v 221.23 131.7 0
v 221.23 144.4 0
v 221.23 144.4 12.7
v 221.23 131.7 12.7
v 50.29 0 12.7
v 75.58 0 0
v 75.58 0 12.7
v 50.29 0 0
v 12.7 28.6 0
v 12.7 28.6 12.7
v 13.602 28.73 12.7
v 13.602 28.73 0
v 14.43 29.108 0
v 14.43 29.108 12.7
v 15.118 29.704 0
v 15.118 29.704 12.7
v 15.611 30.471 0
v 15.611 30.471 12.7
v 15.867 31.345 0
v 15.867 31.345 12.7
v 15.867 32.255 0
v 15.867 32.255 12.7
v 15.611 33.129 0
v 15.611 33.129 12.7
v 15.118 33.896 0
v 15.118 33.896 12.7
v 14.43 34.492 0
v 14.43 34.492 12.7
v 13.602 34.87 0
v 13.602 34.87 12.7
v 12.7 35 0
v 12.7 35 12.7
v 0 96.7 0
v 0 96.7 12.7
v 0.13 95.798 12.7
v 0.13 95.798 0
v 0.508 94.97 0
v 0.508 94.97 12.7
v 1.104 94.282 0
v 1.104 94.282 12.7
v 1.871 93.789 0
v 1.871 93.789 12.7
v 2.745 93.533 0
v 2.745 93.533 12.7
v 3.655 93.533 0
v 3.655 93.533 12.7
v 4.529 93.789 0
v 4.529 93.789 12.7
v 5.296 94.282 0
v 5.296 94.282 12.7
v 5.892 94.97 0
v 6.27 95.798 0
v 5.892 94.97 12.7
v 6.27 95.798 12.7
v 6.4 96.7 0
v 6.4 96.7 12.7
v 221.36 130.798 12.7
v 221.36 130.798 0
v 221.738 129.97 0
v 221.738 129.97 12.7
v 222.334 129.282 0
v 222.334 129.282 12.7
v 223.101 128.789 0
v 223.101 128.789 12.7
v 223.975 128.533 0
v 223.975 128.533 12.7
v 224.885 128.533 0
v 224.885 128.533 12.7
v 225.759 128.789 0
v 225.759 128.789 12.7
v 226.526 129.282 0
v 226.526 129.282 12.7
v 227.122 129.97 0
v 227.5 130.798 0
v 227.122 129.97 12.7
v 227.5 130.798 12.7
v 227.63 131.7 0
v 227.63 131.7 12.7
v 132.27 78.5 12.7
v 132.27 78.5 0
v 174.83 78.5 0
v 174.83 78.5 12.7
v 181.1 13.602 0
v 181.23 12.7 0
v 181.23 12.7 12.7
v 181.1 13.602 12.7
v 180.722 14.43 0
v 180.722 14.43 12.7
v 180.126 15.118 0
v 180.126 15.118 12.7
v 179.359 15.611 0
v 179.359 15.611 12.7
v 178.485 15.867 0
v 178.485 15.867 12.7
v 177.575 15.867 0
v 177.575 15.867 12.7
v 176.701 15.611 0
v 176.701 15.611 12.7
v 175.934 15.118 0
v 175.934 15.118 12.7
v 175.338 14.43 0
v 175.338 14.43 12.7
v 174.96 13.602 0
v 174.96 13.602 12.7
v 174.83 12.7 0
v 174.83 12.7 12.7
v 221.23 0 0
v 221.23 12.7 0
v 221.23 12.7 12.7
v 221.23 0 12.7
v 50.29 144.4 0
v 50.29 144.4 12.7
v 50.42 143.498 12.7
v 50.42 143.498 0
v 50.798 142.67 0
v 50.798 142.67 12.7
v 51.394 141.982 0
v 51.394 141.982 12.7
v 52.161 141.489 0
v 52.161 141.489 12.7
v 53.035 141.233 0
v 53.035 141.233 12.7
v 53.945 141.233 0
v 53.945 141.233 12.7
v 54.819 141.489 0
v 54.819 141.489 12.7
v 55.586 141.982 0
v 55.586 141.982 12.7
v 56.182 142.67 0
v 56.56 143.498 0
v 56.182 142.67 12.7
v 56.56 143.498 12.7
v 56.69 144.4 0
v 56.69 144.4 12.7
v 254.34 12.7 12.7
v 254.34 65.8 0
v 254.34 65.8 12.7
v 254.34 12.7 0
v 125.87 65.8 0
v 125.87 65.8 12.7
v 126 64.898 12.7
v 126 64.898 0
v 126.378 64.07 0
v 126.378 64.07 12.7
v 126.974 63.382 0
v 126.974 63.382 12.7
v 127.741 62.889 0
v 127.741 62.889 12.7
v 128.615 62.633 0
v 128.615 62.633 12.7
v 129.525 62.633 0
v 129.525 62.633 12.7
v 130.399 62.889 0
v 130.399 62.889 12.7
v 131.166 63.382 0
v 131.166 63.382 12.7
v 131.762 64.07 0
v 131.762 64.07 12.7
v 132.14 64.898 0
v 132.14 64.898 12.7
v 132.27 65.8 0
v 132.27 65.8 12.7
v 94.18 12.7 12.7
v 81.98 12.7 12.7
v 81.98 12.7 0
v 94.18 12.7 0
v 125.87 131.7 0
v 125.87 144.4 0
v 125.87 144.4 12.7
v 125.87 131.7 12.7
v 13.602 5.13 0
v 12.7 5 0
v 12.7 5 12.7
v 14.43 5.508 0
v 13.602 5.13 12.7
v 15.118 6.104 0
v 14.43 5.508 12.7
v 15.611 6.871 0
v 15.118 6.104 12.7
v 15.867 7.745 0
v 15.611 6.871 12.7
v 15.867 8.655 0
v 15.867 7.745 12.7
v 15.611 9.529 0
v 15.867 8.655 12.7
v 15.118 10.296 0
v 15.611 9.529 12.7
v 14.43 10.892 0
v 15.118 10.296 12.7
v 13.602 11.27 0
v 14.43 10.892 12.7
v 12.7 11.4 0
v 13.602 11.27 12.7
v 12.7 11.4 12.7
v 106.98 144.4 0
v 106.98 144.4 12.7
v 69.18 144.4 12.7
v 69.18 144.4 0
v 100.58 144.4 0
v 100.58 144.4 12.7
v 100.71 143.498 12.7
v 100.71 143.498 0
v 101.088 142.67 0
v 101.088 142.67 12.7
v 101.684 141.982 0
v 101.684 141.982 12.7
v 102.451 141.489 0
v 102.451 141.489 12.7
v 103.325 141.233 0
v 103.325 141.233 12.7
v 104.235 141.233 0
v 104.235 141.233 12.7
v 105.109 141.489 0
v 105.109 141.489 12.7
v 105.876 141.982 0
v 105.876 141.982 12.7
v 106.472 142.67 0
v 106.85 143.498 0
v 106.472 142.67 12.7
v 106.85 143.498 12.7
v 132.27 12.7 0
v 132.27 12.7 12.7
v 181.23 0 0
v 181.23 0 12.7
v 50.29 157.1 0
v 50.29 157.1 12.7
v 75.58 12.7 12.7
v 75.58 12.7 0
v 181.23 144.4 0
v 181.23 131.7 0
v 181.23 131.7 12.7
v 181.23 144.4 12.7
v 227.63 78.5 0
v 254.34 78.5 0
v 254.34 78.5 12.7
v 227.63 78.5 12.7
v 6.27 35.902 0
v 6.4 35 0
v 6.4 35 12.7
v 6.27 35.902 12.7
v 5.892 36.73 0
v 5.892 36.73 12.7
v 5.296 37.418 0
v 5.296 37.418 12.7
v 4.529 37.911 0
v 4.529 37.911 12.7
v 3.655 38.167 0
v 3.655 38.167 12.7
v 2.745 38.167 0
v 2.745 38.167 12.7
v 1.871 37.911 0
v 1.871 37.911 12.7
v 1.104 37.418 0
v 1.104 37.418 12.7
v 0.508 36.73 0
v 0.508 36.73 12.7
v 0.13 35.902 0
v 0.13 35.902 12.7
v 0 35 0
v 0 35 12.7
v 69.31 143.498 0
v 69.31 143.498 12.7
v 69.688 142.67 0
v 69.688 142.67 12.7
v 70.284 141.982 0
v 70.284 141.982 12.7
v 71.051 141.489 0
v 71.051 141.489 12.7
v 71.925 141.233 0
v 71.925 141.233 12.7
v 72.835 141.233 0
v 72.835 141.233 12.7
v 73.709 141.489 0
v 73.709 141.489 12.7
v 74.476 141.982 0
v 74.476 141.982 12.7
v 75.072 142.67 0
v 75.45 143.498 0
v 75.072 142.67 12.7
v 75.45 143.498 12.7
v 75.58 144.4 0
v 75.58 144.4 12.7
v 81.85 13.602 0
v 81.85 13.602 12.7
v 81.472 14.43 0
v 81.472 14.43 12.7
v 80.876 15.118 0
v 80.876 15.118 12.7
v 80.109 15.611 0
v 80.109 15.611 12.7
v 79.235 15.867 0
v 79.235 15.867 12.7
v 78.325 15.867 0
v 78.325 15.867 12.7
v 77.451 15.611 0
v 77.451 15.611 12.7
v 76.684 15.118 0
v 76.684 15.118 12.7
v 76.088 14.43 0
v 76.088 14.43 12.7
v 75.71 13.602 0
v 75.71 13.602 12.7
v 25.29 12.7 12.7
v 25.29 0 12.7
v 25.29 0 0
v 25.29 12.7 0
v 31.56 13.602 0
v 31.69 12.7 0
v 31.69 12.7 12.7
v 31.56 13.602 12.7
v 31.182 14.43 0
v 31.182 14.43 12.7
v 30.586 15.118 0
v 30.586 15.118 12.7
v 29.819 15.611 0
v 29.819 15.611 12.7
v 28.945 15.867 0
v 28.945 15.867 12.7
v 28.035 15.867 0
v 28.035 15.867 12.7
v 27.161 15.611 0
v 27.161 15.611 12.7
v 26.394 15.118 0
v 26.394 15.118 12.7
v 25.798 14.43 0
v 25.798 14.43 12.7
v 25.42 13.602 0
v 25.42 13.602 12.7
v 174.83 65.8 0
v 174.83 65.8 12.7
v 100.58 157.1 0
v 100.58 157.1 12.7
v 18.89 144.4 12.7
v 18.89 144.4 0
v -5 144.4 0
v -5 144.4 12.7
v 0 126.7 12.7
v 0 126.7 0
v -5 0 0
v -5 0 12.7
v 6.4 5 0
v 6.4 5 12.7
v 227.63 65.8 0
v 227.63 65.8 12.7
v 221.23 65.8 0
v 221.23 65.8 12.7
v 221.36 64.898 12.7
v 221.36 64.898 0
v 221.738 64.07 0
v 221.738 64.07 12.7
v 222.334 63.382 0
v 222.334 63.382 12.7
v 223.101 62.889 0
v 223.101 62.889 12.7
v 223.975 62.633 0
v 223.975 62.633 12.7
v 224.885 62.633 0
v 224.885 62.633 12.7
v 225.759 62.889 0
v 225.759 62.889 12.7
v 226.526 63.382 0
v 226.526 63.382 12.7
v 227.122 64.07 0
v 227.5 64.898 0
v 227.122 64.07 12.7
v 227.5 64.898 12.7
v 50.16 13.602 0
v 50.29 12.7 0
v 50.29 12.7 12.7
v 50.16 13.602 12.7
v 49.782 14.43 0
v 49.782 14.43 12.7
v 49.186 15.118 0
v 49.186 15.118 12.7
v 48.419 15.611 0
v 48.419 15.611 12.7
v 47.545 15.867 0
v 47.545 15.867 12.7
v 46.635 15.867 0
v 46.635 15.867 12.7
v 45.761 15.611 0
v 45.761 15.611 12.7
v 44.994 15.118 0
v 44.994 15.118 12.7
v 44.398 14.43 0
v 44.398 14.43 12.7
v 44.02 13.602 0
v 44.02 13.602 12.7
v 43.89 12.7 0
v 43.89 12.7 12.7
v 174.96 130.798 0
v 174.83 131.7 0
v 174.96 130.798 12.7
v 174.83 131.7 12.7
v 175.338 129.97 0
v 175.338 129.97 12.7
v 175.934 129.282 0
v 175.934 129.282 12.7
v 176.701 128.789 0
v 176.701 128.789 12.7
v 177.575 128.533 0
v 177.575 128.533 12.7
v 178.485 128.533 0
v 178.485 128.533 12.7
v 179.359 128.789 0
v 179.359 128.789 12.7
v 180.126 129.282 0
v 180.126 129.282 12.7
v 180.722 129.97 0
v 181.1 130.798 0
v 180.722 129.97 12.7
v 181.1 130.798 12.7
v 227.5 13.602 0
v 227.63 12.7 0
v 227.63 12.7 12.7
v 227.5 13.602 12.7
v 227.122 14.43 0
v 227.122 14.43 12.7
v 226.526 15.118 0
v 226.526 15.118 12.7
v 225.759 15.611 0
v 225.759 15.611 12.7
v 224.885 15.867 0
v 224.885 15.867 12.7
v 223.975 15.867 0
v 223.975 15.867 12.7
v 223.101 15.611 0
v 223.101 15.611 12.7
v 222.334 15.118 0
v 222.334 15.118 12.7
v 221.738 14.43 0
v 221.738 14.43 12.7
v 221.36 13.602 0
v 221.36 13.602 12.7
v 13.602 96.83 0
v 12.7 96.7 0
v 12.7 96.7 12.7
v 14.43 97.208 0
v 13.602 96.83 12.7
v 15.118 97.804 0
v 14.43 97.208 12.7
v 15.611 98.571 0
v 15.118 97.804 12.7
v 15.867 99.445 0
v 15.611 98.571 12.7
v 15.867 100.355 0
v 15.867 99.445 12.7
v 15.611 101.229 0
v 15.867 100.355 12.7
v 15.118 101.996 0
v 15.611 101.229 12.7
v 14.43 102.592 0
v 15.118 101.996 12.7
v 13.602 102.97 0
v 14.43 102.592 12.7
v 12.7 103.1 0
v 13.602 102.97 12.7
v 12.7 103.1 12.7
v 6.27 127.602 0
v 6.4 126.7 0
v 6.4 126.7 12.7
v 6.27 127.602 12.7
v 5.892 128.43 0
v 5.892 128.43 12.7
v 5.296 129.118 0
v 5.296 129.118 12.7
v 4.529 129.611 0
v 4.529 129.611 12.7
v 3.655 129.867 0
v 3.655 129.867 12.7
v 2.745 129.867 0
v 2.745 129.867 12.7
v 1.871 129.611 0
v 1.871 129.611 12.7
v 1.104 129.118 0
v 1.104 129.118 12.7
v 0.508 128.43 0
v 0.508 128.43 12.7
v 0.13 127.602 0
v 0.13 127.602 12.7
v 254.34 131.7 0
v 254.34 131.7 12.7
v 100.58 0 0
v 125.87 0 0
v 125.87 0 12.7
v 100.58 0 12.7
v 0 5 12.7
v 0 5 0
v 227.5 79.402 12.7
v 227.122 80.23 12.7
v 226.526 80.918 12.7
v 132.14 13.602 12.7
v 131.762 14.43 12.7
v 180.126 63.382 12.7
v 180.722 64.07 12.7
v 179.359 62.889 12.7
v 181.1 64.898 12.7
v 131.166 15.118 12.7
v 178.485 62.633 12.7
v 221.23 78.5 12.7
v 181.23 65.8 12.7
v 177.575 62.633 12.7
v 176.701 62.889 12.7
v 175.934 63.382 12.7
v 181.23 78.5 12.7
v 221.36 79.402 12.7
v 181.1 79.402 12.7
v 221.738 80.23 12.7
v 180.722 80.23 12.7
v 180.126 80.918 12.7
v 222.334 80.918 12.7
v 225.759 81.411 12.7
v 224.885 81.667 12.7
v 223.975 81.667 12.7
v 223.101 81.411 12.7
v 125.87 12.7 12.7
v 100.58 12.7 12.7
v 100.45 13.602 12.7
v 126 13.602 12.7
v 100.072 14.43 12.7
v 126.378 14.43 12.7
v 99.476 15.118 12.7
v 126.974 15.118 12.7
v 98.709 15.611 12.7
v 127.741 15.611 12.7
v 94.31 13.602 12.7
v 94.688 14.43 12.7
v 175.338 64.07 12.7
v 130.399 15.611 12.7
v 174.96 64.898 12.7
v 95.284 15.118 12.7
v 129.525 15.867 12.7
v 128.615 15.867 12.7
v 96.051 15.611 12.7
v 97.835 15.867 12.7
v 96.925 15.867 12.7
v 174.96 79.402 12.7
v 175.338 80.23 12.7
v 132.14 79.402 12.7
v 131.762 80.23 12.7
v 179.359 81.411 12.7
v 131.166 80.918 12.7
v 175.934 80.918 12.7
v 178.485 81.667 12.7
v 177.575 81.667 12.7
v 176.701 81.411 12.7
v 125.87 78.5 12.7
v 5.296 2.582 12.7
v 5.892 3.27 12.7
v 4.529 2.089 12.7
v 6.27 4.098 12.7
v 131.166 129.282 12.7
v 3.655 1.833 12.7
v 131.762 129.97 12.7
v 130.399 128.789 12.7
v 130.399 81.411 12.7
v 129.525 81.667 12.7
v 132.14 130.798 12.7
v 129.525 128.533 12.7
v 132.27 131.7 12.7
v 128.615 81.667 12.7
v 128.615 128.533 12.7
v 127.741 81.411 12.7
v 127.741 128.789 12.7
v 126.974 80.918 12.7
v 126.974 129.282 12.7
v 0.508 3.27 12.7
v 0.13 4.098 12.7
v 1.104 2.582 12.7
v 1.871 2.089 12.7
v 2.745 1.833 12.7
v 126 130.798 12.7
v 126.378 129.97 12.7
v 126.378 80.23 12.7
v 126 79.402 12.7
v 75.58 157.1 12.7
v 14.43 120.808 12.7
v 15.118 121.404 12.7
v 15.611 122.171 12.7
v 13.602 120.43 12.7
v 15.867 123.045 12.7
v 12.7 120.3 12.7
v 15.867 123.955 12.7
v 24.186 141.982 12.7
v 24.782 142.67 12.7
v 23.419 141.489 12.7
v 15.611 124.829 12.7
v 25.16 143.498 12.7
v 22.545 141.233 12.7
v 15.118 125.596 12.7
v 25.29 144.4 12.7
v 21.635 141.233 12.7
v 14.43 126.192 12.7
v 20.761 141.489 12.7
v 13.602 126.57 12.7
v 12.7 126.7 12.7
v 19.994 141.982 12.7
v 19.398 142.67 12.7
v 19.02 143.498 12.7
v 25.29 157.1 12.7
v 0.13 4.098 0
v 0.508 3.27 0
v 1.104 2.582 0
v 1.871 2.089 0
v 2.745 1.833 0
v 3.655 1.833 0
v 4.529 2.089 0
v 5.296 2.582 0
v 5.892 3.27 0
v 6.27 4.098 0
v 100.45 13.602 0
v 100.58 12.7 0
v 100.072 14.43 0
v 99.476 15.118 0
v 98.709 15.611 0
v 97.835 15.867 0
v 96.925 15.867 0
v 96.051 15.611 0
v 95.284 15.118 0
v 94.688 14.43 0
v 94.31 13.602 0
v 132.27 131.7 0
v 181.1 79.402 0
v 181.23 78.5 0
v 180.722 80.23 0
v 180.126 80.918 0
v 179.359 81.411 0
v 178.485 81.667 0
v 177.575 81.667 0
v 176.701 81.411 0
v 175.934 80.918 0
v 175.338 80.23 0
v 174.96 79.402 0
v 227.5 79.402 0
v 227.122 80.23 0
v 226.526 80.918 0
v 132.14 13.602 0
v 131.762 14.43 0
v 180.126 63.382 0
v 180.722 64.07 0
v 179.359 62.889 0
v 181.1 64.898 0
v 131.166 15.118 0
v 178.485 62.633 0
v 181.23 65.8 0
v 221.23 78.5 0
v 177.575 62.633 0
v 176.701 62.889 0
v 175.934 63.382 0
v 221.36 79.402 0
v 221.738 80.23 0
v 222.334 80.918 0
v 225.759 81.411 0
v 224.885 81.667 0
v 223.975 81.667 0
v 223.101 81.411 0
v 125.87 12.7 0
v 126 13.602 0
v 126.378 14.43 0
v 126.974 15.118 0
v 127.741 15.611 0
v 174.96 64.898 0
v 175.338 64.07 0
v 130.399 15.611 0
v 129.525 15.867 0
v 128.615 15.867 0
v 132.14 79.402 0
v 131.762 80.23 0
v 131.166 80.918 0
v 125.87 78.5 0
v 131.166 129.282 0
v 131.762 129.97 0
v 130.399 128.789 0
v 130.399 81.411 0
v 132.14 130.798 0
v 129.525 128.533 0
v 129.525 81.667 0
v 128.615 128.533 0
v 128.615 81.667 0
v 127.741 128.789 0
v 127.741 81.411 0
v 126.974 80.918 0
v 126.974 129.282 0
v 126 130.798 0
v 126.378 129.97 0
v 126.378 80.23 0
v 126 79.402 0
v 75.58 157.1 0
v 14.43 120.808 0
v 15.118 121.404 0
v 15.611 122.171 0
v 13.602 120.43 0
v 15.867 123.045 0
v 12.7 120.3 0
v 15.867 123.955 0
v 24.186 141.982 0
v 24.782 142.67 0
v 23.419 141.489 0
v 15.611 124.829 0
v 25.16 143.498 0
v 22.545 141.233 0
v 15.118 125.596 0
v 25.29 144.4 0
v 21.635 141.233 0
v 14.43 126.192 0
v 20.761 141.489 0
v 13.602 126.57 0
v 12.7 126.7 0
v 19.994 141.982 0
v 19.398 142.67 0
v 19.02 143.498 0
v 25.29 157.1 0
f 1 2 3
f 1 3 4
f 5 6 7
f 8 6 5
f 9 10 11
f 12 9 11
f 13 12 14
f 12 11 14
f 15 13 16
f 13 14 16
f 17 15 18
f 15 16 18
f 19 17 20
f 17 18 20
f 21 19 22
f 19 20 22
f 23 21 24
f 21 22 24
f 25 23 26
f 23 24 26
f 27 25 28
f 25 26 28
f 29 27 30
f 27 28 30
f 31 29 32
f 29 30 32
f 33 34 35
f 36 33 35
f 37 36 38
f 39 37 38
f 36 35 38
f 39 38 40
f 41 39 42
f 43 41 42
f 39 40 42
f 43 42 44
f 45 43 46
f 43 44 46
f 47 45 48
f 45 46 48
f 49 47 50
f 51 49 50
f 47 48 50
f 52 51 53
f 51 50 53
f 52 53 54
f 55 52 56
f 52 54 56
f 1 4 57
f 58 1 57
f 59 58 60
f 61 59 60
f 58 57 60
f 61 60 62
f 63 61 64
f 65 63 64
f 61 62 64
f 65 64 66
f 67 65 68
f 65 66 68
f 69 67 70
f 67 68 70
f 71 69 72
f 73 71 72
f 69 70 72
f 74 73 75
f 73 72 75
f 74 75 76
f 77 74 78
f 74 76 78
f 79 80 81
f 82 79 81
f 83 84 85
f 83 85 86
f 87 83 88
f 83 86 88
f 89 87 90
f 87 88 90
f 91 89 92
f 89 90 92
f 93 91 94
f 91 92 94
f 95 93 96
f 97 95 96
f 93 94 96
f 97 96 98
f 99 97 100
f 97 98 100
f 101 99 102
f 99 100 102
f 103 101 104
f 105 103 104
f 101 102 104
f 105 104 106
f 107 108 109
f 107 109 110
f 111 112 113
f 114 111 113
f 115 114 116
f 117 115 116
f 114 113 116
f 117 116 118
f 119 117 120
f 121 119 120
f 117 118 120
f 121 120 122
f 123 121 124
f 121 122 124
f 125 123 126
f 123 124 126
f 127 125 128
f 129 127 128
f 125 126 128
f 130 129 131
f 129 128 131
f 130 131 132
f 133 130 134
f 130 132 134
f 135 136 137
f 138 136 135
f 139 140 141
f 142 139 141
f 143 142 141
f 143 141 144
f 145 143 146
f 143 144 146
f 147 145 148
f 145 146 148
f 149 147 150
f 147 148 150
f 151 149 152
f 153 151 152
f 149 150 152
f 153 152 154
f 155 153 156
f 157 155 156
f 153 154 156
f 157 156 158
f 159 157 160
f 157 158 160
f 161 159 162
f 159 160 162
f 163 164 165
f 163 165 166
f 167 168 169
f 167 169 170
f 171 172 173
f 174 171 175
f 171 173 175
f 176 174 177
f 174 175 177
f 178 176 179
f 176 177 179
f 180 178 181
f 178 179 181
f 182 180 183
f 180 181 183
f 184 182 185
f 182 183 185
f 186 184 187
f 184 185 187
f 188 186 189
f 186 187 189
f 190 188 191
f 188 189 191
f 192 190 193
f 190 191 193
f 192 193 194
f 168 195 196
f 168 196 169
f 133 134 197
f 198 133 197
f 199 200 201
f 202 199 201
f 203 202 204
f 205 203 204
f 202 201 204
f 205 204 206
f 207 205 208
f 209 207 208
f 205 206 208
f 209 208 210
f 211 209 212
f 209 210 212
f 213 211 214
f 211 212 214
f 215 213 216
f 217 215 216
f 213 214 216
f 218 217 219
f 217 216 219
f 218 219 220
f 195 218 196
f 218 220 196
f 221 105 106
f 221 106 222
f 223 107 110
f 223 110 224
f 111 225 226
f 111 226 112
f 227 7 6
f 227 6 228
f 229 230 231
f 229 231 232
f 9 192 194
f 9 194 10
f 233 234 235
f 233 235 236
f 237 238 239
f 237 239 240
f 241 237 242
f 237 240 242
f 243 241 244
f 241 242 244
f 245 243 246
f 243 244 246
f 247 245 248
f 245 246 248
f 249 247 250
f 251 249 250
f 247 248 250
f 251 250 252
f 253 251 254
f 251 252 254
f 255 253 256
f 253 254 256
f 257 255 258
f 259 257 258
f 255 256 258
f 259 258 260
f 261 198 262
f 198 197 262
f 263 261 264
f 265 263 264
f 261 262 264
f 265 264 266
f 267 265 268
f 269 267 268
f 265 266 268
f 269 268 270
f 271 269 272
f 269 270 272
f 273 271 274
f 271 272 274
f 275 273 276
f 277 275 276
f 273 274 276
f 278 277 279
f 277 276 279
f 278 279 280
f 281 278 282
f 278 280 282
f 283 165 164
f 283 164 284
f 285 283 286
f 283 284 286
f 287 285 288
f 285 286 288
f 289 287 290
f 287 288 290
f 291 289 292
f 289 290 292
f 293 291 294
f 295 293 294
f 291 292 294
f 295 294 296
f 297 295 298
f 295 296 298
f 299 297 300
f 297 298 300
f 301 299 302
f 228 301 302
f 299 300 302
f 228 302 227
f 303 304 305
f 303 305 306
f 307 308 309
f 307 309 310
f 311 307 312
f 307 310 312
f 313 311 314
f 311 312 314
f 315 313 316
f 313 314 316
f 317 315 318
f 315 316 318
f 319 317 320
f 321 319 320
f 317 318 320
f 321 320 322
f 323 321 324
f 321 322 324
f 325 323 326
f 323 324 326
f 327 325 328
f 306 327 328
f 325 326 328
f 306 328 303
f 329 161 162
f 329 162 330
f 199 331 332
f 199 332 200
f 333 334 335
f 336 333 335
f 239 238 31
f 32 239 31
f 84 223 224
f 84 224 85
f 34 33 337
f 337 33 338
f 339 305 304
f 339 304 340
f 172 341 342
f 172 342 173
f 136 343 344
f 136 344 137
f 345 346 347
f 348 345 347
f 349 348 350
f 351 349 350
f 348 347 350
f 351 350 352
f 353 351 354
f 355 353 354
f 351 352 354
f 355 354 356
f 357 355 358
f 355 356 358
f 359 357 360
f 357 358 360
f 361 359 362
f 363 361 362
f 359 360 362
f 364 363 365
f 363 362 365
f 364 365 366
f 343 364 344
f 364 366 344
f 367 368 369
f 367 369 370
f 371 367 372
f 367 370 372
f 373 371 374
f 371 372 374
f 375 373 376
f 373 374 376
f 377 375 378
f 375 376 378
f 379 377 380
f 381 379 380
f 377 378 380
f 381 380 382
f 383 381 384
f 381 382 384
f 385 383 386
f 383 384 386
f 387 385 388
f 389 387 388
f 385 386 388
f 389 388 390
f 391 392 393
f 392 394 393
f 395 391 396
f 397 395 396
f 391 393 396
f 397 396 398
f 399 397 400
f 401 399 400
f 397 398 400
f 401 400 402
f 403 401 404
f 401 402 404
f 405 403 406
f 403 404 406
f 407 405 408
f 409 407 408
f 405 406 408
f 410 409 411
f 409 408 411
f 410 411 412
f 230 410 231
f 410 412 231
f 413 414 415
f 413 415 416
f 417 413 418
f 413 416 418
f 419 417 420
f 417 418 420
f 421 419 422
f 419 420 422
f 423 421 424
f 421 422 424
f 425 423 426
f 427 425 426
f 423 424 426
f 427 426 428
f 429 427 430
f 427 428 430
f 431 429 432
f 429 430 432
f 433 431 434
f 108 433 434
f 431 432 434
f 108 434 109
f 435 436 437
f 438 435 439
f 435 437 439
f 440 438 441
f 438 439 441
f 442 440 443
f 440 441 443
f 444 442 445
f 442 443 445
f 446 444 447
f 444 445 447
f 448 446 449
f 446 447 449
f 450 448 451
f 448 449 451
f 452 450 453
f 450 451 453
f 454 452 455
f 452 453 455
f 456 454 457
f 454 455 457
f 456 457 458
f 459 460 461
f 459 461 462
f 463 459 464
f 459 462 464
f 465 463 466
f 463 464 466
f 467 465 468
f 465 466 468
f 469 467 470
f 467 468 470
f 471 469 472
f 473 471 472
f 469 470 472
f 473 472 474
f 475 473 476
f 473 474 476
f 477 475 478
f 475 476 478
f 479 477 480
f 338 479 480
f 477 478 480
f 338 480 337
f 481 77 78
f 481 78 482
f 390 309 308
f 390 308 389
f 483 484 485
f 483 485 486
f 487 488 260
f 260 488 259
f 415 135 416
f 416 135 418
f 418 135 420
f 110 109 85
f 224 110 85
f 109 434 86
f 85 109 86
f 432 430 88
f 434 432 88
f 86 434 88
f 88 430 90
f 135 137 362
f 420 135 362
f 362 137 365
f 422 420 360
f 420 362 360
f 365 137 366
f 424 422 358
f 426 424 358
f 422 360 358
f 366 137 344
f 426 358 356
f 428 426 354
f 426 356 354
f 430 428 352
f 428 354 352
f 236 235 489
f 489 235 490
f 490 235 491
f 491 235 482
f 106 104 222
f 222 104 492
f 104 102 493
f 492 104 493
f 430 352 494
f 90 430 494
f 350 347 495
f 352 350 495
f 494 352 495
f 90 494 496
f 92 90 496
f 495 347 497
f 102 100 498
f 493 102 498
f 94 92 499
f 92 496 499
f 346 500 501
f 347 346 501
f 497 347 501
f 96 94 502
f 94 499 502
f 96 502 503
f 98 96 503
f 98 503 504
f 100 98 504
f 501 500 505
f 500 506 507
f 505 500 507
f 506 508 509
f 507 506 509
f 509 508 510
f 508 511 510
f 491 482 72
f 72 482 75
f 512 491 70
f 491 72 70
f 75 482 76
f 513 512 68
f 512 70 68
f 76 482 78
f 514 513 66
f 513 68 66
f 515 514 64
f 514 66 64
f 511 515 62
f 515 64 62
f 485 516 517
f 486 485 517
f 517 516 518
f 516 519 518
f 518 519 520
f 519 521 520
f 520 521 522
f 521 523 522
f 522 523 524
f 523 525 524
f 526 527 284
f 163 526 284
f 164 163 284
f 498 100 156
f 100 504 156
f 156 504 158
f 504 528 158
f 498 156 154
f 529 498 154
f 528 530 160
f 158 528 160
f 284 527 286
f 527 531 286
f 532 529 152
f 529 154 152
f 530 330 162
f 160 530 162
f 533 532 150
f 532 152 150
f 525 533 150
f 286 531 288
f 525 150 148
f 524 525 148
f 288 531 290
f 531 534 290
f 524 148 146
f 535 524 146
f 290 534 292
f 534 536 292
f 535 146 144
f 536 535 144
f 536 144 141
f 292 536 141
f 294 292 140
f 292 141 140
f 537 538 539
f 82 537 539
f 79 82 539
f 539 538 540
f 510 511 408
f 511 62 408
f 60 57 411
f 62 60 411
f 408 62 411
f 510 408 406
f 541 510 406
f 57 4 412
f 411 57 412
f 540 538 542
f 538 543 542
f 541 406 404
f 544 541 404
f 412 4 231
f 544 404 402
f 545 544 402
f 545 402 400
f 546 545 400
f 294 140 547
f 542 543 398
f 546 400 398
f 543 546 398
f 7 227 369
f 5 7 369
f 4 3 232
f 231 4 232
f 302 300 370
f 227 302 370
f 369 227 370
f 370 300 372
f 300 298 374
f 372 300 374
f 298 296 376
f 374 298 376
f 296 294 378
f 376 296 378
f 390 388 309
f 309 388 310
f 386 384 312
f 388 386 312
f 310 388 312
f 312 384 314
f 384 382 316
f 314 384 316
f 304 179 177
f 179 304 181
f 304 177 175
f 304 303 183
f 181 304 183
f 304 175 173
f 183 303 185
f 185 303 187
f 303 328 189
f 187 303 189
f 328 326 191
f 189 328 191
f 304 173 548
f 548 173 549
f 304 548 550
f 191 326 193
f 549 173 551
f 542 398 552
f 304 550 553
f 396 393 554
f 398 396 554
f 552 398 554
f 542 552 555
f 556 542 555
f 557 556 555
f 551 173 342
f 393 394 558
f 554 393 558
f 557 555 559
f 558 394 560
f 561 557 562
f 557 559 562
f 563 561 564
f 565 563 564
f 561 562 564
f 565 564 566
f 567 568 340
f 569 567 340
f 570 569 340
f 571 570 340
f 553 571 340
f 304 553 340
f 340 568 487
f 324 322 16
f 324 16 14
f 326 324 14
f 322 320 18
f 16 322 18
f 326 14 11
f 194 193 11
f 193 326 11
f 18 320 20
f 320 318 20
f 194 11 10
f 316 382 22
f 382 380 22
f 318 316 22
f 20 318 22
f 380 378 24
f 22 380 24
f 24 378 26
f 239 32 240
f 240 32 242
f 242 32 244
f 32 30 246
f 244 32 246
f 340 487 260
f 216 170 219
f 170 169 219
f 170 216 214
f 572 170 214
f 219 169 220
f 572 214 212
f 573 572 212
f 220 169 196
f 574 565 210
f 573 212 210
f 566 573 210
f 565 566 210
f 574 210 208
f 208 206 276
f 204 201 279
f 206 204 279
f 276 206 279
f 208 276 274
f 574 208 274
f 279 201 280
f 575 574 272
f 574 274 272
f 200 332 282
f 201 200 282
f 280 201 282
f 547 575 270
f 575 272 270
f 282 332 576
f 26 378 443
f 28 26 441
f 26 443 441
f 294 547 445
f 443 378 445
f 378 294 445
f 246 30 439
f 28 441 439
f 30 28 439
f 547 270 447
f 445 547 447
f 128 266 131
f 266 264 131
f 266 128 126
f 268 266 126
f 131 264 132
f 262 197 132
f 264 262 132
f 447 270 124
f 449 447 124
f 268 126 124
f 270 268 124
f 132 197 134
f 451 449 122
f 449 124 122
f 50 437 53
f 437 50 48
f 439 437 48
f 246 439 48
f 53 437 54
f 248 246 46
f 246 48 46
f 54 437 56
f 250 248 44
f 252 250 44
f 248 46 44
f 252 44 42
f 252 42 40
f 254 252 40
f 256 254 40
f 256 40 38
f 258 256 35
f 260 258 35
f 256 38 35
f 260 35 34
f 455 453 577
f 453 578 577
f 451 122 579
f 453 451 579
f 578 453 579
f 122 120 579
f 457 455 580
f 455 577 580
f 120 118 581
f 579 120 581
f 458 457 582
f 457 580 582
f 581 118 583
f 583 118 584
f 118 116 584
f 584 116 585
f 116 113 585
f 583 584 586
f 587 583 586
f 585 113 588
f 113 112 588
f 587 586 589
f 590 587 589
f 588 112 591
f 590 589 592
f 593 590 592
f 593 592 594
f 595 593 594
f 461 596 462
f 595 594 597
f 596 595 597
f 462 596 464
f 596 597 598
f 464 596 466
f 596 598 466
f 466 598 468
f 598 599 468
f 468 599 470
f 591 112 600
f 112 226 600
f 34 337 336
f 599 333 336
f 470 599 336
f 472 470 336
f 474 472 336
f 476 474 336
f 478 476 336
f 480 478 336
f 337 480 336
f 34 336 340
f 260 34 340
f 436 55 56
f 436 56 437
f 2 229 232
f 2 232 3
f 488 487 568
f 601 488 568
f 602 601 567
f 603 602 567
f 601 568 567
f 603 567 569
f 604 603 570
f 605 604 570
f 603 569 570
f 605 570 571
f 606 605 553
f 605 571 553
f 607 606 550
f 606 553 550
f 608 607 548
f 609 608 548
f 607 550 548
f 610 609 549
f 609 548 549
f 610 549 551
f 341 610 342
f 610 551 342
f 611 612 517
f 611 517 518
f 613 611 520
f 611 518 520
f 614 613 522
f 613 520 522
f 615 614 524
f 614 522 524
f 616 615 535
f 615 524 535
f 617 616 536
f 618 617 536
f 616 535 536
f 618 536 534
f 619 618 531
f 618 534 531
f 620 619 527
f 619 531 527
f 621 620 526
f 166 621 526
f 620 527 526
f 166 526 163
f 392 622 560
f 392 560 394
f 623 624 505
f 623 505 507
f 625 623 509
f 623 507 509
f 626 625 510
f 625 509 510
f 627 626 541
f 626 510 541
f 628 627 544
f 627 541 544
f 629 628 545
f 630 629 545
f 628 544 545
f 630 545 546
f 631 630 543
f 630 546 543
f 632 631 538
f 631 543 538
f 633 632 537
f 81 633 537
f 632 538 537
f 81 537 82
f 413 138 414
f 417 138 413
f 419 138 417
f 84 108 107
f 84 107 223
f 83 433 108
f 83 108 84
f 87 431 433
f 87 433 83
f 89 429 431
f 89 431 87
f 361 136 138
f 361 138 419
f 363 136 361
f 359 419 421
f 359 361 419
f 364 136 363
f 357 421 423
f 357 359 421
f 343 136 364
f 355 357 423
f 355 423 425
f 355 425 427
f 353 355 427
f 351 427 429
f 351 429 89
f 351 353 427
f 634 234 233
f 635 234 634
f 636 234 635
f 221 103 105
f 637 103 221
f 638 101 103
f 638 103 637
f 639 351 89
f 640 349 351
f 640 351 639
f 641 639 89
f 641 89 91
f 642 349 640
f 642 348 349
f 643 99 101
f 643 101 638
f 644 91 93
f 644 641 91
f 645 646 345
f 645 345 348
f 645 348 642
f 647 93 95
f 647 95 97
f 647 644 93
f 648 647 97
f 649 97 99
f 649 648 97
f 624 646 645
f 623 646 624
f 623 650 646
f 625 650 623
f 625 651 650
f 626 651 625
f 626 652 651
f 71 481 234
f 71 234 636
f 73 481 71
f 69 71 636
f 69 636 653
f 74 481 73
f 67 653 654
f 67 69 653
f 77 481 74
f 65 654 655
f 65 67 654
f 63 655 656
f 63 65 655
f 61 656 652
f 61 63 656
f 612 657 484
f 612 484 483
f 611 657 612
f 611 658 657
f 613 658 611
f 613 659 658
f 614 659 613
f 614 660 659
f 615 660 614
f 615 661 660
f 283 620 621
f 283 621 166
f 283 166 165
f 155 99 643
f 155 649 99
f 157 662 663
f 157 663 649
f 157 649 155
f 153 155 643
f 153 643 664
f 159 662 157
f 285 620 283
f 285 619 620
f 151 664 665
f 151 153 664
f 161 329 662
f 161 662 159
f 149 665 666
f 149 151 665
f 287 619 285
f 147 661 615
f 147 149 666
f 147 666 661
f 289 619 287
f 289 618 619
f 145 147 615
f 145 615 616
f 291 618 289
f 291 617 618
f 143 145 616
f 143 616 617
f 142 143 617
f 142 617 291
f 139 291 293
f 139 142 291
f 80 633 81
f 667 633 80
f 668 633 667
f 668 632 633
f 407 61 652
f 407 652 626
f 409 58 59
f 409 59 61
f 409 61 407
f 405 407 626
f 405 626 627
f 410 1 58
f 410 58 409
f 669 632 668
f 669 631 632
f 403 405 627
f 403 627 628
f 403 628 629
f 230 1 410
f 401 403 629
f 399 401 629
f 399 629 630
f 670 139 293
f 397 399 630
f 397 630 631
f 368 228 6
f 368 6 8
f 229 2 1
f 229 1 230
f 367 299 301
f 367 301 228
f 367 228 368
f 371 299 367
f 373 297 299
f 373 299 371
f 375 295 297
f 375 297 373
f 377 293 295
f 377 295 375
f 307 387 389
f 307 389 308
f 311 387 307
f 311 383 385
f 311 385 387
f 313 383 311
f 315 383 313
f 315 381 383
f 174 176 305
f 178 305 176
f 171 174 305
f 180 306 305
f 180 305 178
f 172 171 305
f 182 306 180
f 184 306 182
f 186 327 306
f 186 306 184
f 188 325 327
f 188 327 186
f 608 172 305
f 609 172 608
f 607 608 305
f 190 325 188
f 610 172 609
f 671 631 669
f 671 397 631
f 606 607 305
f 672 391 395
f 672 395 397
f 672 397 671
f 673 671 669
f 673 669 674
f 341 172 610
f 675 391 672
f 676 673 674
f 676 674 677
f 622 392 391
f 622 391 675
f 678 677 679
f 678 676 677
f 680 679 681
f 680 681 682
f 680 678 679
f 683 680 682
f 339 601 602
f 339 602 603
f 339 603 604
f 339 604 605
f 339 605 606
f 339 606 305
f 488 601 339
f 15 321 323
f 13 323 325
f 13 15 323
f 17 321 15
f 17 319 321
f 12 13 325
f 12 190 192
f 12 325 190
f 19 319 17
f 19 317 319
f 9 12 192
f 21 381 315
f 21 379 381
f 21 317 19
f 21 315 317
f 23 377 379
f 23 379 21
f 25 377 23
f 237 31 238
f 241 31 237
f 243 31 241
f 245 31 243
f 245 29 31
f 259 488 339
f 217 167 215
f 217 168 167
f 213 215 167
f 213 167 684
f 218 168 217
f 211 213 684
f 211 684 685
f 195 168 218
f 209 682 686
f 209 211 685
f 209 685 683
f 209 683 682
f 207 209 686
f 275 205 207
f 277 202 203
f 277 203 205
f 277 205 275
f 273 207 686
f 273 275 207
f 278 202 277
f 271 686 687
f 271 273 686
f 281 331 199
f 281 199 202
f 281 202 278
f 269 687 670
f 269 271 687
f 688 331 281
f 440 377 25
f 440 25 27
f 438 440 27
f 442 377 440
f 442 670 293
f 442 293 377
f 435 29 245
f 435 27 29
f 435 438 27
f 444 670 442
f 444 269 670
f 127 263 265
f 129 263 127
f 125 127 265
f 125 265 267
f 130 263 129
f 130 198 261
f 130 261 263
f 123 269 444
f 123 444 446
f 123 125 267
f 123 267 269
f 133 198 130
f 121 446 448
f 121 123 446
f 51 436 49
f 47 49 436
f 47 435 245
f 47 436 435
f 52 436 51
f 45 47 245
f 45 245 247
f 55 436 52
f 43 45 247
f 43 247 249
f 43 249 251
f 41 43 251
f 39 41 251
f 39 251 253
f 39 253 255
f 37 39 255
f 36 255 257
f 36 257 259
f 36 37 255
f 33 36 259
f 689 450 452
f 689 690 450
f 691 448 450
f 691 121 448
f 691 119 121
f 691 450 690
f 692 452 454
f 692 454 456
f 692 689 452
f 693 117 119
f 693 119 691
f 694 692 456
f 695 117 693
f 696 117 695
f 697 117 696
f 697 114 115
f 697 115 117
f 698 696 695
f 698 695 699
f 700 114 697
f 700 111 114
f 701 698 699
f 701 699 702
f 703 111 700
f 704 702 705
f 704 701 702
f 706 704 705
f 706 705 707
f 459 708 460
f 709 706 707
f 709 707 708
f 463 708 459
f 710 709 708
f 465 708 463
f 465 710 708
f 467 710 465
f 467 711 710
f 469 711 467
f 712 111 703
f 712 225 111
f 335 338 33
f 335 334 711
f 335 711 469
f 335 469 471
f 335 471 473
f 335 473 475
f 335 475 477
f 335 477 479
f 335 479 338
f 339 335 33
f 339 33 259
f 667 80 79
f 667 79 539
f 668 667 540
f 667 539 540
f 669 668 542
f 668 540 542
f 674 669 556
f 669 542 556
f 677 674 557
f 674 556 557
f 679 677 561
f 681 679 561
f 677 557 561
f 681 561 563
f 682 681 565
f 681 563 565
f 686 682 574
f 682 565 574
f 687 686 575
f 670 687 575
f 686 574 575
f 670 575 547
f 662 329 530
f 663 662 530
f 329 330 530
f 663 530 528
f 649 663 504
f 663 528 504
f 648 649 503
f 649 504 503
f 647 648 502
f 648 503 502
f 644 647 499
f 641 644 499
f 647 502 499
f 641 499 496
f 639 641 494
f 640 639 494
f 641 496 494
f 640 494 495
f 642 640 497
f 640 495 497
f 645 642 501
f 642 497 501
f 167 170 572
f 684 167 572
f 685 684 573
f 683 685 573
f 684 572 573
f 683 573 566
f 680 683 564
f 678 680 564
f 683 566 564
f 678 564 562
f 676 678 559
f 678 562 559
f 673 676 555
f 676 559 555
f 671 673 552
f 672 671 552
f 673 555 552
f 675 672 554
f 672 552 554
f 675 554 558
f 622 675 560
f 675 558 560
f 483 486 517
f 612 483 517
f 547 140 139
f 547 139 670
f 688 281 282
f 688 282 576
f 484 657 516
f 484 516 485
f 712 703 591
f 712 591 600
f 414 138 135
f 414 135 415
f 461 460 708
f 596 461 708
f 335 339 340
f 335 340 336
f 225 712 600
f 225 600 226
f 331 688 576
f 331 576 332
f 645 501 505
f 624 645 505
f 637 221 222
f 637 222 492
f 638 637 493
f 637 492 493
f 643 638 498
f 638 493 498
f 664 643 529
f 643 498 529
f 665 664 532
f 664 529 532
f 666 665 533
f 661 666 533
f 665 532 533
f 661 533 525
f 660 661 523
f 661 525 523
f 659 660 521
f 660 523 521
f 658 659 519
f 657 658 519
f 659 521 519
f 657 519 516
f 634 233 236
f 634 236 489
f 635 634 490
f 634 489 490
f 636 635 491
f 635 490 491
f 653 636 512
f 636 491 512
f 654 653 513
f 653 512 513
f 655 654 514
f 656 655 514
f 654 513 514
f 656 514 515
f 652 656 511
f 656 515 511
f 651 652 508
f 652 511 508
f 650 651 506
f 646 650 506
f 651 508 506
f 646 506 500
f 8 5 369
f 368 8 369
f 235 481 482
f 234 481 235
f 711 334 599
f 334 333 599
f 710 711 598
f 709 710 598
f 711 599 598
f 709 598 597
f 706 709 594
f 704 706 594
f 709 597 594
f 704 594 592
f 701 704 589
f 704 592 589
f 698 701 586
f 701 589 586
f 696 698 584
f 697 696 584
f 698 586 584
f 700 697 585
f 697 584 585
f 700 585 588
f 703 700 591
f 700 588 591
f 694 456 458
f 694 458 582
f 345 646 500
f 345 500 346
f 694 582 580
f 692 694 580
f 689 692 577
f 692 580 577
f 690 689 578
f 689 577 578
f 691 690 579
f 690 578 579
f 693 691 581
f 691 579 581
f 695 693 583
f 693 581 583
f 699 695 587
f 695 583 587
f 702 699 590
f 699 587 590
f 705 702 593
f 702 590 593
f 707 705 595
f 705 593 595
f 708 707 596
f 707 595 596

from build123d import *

# Parameters (mm, degrees)
SKETCH1_W           = 12.7
SKETCH1_H           = 30
SKETCH1_W_2         = 55.36
SKETCH1_H_2         = 12.7
BOSS_EXTRUDE1_DEPTH = 12.7
SKETCH3_W           = 25
SKETCH3_H           = 12.7
CUT_EXTRUDE2_DEPTH  = 300.216536308
SKETCH2_R           = 3.2
CUT_EXTRUDE1_DEPTH  = 300.216536308


with BuildPart() as part:
    # Sketch1 → Boss-Extrude1 (new body)
    with BuildSketch(Plane.XY):
        Polygon((221.23, 144.4), (221.23, 131.7), (254.34, 131.7), (254.34, 78.5), (221.23, 78.5), (221.23, 65.8), (254.34, 65.8), (254.34, 12.7), (221.23, 12.7), (221.23, 0), (181.23, 0), (181.23, 12.7), (125.87, 12.7), (125.87, 0), (-5, 0), (-5, 144.4), (0, 144.4), (25.29, 144.4), (25.29, 157.1), (50.29, 157.1), (50.29, 144.4), (75.58, 144.4), (75.58, 157.1), (100.58, 157.1), (100.58, 144.4), (125.87, 144.4), (125.87, 131.7), (181.23, 131.7), (181.23, 144.4), align=None)
        with Locations((6.35, 111.7)):
            Rectangle(SKETCH1_W, SKETCH1_H, mode=Mode.SUBTRACT)
        with Locations((6.35, 20)):
            Rectangle(SKETCH1_W, SKETCH1_H, mode=Mode.SUBTRACT)
        with Locations((153.55, 72.15)):
            Rectangle(SKETCH1_W_2, SKETCH1_H_2, mode=Mode.SUBTRACT)
    extrude(amount=BOSS_EXTRUDE1_DEPTH)

    # Sketch3 → Cut-Extrude2 (cut, through all)
    with BuildSketch(Plane.XY.offset(12.7)):
        with Locations((37.79, 6.35)):
            Rectangle(SKETCH3_W, SKETCH3_H)
        with Locations((88.08, 6.35)):
            Rectangle(SKETCH3_W, SKETCH3_H)
    extrude(amount=-CUT_EXTRUDE2_DEPTH, mode=Mode.SUBTRACT)

    # Sketch2 → Cut-Extrude1 (cut, through all)
    with BuildSketch(Plane.XY.offset(12.7)):
        with Locations((129.07, 131.7)):
            Circle(SKETCH2_R)
        with Locations((178.03, 131.7)):
            Circle(SKETCH2_R)
        with Locations((224.43, 131.7)):
            Circle(SKETCH2_R)
        with Locations((224.43, 78.5)):
            Circle(SKETCH2_R)
        with Locations((224.43, 65.8)):
            Circle(SKETCH2_R)
        with Locations((224.43, 12.7)):
            Circle(SKETCH2_R)
        with Locations((28.49, 12.7)):
            Circle(SKETCH2_R)
        with Locations((47.09, 12.7)):
            Circle(SKETCH2_R)
        with Locations((178.03, 12.7)):
            Circle(SKETCH2_R)
        with Locations((178.03, 65.8)):
            Circle(SKETCH2_R)
        with Locations((178.03, 78.5)):
            Circle(SKETCH2_R)
        with Locations((129.07, 78.5)):
            Circle(SKETCH2_R)
        with Locations((129.07, 65.8)):
            Circle(SKETCH2_R)
        with Locations((129.07, 12.7)):
            Circle(SKETCH2_R)
        with Locations((78.78, 12.7)):
            Circle(SKETCH2_R)
        with Locations((3.2, 126.7)):
            Circle(SKETCH2_R)
        with Locations((3.2, 96.7)):
            Circle(SKETCH2_R)
        with Locations((3.2, 35)):
            Circle(SKETCH2_R)
        with Locations((3.2, 5)):
            Circle(SKETCH2_R)
        with Locations((12.7, 8.2)):
            Circle(SKETCH2_R)
        with Locations((12.7, 31.8)):
            Circle(SKETCH2_R)
        with Locations((12.7, 99.9)):
            Circle(SKETCH2_R)
        with Locations((12.7, 123.5)):
            Circle(SKETCH2_R)
        with Locations((22.09, 144.4)):
            Circle(SKETCH2_R)
        with Locations((53.49, 144.4)):
            Circle(SKETCH2_R)
        with Locations((72.38, 144.4)):
            Circle(SKETCH2_R)
        with Locations((103.78, 144.4)):
            Circle(SKETCH2_R)
        with Locations((97.38, 12.7)):
            Circle(SKETCH2_R)
    extrude(amount=-CUT_EXTRUDE1_DEPTH, mode=Mode.SUBTRACT)


solid = part.part
